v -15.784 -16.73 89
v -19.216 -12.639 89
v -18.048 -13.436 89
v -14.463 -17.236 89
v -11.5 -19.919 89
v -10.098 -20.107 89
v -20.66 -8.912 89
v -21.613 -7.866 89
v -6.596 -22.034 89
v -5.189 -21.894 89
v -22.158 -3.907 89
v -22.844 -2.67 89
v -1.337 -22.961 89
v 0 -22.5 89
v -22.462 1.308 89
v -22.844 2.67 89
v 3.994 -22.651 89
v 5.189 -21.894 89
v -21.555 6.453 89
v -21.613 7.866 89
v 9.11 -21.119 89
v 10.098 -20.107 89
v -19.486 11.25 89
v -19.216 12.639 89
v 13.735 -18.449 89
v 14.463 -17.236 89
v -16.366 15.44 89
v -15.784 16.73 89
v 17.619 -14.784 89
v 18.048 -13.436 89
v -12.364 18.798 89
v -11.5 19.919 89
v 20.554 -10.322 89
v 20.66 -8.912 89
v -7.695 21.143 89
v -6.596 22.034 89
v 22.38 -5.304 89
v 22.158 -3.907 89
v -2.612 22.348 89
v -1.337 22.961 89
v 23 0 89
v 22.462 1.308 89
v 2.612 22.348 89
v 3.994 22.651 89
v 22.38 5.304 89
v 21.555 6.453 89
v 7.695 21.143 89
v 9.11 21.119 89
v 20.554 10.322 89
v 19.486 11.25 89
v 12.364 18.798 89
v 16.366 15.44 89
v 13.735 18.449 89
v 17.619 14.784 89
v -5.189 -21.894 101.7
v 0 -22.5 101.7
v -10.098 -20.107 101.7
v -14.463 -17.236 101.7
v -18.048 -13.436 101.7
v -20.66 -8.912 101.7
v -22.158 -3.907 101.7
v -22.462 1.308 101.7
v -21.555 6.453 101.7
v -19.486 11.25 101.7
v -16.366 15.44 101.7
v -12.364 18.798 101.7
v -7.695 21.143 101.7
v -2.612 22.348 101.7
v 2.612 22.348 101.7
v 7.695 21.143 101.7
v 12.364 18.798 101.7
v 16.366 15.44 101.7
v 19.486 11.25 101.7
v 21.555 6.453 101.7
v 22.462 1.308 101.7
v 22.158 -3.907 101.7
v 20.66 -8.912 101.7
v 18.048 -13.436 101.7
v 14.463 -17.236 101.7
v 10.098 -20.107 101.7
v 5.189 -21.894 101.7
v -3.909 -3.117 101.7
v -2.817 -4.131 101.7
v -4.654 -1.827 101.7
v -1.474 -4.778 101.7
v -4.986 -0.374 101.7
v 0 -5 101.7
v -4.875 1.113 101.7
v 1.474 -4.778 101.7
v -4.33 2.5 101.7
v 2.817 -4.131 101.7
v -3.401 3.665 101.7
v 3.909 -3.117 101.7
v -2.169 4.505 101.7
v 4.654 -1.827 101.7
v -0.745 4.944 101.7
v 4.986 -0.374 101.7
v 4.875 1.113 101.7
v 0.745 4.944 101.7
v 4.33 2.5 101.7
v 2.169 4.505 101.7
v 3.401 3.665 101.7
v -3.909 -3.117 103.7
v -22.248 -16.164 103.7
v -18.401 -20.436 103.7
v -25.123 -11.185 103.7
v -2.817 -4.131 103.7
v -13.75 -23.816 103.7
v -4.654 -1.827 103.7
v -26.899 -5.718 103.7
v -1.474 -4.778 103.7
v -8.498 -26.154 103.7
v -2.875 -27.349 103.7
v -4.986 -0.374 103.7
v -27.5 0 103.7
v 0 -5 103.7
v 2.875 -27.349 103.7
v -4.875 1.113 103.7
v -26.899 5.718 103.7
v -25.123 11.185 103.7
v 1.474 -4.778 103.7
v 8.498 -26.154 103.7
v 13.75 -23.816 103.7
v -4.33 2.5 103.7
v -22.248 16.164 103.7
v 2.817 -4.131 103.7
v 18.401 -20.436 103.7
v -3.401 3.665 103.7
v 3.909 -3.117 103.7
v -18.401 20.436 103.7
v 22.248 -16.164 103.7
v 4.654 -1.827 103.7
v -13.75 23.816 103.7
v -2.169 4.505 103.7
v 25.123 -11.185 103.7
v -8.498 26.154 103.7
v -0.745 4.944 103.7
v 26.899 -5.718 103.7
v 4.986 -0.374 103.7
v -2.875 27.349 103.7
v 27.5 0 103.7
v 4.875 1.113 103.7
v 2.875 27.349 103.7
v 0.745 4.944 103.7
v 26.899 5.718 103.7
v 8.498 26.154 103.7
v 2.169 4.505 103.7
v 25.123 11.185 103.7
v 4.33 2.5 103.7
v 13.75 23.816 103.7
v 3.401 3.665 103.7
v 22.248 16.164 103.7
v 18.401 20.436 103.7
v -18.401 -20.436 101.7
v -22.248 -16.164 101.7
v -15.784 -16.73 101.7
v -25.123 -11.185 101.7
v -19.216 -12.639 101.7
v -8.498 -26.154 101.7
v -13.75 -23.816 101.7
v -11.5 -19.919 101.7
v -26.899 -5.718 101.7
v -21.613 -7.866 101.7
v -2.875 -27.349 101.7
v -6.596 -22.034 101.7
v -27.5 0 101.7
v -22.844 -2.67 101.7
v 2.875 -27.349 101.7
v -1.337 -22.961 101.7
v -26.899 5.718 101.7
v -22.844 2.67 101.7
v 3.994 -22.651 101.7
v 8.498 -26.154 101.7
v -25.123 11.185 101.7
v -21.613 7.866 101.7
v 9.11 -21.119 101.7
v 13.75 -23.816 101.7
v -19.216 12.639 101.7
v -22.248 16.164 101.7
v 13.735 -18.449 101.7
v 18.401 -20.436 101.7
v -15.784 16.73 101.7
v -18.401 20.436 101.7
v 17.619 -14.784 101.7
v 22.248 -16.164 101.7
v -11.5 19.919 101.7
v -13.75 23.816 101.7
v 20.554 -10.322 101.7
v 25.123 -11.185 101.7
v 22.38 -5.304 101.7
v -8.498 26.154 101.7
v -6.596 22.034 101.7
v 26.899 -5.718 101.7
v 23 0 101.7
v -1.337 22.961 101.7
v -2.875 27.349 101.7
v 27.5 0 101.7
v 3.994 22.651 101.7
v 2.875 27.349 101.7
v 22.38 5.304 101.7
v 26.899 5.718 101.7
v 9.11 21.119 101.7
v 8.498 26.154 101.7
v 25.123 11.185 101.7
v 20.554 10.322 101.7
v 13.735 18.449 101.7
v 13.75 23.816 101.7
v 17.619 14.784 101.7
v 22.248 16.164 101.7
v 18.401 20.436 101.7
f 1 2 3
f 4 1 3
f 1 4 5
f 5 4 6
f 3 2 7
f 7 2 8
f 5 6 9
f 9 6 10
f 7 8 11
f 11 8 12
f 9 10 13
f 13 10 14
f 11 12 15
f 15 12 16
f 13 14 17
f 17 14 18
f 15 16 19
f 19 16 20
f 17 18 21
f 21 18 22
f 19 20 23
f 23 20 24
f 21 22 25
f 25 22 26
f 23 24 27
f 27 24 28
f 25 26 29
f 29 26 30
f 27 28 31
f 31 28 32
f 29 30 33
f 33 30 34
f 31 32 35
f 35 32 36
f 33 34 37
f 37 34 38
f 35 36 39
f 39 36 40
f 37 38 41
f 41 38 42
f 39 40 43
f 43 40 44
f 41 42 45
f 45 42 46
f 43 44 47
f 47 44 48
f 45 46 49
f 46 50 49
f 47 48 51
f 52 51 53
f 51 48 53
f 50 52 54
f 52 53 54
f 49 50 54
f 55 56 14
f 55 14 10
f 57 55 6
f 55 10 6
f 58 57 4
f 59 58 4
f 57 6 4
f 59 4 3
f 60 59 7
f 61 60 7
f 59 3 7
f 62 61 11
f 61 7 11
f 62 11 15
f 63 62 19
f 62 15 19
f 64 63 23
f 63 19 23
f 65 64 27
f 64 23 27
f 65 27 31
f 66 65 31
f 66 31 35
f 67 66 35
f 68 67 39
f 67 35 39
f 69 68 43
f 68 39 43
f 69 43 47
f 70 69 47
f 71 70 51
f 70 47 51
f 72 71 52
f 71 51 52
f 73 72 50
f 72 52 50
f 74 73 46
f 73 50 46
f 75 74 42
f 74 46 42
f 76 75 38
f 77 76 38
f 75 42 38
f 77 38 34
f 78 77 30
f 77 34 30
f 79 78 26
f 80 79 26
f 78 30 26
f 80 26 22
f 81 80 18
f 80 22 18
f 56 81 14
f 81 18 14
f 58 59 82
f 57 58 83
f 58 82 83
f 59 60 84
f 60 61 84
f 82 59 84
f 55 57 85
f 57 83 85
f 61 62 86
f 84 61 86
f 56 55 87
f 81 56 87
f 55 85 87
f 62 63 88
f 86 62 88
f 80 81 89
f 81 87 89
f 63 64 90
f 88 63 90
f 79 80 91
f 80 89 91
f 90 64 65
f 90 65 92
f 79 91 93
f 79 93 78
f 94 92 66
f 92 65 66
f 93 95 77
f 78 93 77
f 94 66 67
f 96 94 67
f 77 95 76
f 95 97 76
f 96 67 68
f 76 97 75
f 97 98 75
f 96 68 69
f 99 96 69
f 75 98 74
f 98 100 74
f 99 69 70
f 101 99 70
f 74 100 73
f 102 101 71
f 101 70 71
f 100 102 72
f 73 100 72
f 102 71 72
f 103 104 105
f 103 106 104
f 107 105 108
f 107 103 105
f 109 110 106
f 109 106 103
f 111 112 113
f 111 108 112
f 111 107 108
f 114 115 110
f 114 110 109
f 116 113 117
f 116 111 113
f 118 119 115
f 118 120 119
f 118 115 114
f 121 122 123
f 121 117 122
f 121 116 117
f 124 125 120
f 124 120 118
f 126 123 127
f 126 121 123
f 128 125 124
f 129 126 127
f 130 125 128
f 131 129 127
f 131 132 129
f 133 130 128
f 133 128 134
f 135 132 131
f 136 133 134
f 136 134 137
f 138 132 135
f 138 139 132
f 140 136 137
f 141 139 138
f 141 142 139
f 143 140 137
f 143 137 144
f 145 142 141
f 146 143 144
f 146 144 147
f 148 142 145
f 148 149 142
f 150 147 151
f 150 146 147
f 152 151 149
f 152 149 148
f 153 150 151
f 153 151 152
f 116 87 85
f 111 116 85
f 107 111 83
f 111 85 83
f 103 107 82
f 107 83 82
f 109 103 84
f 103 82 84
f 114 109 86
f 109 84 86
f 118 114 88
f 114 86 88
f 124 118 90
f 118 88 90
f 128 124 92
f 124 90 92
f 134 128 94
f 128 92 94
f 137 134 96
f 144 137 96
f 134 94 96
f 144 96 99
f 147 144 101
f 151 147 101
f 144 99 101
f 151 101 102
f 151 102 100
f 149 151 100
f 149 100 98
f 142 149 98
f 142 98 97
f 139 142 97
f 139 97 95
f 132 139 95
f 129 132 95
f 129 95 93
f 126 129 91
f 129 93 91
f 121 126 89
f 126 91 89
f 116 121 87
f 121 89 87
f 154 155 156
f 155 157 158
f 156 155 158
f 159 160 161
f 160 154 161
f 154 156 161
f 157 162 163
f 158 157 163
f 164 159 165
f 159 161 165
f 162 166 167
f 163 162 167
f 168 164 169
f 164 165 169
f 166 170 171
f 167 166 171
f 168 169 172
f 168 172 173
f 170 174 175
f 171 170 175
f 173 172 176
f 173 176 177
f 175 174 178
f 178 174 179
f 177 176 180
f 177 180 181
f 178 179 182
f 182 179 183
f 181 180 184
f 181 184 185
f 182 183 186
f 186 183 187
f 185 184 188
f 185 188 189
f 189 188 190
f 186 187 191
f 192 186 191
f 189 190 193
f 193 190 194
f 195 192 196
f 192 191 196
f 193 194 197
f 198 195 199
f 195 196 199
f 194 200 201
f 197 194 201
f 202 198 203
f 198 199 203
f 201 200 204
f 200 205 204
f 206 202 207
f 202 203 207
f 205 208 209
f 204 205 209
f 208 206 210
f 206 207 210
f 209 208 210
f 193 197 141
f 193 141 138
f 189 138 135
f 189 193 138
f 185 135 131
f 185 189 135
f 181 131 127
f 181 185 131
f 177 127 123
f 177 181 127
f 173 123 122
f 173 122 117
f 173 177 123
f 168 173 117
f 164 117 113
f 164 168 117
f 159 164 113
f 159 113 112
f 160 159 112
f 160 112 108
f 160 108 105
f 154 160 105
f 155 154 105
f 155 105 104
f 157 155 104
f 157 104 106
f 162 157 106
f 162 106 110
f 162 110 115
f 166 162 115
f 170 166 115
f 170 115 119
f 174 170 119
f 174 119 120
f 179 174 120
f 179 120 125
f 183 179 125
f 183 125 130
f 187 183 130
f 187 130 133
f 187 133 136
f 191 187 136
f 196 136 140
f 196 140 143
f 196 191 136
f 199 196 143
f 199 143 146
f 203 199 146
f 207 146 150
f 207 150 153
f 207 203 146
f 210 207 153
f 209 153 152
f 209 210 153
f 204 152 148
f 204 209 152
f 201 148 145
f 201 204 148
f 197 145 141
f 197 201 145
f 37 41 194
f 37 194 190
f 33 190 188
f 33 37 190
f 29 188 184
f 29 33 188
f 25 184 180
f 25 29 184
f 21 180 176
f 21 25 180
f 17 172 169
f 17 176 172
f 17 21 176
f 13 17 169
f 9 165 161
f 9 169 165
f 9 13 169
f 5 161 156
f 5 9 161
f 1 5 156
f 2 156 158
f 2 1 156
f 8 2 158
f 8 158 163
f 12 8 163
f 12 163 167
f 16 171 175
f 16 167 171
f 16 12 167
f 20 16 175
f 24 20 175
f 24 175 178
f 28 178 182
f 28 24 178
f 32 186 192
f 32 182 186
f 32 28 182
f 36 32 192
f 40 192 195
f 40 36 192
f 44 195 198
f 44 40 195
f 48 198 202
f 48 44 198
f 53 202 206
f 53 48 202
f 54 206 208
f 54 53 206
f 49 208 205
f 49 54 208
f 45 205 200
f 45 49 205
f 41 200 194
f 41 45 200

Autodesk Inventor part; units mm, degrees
ref_plane "YZ Plane" through (0, 0, 0) normal (1, 0, 0) x (0, 1, 0)
ref_plane "XZ Plane" through (0, 0, 0) normal (0, 1, 0) x (-1, 0, 0)
ref_plane "Work Plane1" through (0, 0, 76.3) normal (0, 0, 1) x (1, 0, 0)
ref_plane "Work Plane2" through (0, 0, 89) normal (0, 0, 1) x (1, 0, 0)
sketch "Sketch4" plane through (0, 0, 89) normal (0, 0, 1) x (1, 0, 0)
  circle A0 centre (0, 0) radius 23.5 projected
  circle A1 centre (0, 0) radius 23
  dimension "d20" = 46
extrude "Extrusion4" add sketch "Sketch4" along normal blind 12.7 contours A1
sketch "Sketch5" plane through (0, 0, 101.7) normal (0, 0, 1) x (1, 0, 0)
  circle A0 centre (0, 0) radius 23 projected
  circle A1 centre (0, 0) radius 23 projected
hole "Hole2" at (0, 0, 101.7) direction (0, 0, -1) diameter 45 depth 12.8
sketch "Sketch6" plane through (0, 0, 101.7) normal (0, 0, 1) x (1, 0, 0)
  circle A0 centre (0, 0) radius 22.5 projected
  circle A1 centre (0, 0) radius 23 projected
  line L0 (0, -38.5) -> (0, 38.5) projected
  line L1 (-38.5, 0) -> (38.5, 0) projected
  circle A2 centre (0, 0) radius 27.5
  dimension "d30" = 55
extrude "Extrusion5" add sketch "Sketch6" along normal blind 2
sketch "Sketch7" plane through (0, 0, 103.7) normal (0, 0, 1) x (1, 0, 0)
  circle A0 centre (0, 0) radius 27.5 projected
  line L0 (0, -38.5) -> (0, 38.5) projected
  line L1 (-38.5, 0) -> (38.5, 0) projected
hole "Hole3" at (0, 0, 103.7) direction (0, 0, -1) diameter 10 depth 8 tip angle 118
properties part number "Plastic Lid"
